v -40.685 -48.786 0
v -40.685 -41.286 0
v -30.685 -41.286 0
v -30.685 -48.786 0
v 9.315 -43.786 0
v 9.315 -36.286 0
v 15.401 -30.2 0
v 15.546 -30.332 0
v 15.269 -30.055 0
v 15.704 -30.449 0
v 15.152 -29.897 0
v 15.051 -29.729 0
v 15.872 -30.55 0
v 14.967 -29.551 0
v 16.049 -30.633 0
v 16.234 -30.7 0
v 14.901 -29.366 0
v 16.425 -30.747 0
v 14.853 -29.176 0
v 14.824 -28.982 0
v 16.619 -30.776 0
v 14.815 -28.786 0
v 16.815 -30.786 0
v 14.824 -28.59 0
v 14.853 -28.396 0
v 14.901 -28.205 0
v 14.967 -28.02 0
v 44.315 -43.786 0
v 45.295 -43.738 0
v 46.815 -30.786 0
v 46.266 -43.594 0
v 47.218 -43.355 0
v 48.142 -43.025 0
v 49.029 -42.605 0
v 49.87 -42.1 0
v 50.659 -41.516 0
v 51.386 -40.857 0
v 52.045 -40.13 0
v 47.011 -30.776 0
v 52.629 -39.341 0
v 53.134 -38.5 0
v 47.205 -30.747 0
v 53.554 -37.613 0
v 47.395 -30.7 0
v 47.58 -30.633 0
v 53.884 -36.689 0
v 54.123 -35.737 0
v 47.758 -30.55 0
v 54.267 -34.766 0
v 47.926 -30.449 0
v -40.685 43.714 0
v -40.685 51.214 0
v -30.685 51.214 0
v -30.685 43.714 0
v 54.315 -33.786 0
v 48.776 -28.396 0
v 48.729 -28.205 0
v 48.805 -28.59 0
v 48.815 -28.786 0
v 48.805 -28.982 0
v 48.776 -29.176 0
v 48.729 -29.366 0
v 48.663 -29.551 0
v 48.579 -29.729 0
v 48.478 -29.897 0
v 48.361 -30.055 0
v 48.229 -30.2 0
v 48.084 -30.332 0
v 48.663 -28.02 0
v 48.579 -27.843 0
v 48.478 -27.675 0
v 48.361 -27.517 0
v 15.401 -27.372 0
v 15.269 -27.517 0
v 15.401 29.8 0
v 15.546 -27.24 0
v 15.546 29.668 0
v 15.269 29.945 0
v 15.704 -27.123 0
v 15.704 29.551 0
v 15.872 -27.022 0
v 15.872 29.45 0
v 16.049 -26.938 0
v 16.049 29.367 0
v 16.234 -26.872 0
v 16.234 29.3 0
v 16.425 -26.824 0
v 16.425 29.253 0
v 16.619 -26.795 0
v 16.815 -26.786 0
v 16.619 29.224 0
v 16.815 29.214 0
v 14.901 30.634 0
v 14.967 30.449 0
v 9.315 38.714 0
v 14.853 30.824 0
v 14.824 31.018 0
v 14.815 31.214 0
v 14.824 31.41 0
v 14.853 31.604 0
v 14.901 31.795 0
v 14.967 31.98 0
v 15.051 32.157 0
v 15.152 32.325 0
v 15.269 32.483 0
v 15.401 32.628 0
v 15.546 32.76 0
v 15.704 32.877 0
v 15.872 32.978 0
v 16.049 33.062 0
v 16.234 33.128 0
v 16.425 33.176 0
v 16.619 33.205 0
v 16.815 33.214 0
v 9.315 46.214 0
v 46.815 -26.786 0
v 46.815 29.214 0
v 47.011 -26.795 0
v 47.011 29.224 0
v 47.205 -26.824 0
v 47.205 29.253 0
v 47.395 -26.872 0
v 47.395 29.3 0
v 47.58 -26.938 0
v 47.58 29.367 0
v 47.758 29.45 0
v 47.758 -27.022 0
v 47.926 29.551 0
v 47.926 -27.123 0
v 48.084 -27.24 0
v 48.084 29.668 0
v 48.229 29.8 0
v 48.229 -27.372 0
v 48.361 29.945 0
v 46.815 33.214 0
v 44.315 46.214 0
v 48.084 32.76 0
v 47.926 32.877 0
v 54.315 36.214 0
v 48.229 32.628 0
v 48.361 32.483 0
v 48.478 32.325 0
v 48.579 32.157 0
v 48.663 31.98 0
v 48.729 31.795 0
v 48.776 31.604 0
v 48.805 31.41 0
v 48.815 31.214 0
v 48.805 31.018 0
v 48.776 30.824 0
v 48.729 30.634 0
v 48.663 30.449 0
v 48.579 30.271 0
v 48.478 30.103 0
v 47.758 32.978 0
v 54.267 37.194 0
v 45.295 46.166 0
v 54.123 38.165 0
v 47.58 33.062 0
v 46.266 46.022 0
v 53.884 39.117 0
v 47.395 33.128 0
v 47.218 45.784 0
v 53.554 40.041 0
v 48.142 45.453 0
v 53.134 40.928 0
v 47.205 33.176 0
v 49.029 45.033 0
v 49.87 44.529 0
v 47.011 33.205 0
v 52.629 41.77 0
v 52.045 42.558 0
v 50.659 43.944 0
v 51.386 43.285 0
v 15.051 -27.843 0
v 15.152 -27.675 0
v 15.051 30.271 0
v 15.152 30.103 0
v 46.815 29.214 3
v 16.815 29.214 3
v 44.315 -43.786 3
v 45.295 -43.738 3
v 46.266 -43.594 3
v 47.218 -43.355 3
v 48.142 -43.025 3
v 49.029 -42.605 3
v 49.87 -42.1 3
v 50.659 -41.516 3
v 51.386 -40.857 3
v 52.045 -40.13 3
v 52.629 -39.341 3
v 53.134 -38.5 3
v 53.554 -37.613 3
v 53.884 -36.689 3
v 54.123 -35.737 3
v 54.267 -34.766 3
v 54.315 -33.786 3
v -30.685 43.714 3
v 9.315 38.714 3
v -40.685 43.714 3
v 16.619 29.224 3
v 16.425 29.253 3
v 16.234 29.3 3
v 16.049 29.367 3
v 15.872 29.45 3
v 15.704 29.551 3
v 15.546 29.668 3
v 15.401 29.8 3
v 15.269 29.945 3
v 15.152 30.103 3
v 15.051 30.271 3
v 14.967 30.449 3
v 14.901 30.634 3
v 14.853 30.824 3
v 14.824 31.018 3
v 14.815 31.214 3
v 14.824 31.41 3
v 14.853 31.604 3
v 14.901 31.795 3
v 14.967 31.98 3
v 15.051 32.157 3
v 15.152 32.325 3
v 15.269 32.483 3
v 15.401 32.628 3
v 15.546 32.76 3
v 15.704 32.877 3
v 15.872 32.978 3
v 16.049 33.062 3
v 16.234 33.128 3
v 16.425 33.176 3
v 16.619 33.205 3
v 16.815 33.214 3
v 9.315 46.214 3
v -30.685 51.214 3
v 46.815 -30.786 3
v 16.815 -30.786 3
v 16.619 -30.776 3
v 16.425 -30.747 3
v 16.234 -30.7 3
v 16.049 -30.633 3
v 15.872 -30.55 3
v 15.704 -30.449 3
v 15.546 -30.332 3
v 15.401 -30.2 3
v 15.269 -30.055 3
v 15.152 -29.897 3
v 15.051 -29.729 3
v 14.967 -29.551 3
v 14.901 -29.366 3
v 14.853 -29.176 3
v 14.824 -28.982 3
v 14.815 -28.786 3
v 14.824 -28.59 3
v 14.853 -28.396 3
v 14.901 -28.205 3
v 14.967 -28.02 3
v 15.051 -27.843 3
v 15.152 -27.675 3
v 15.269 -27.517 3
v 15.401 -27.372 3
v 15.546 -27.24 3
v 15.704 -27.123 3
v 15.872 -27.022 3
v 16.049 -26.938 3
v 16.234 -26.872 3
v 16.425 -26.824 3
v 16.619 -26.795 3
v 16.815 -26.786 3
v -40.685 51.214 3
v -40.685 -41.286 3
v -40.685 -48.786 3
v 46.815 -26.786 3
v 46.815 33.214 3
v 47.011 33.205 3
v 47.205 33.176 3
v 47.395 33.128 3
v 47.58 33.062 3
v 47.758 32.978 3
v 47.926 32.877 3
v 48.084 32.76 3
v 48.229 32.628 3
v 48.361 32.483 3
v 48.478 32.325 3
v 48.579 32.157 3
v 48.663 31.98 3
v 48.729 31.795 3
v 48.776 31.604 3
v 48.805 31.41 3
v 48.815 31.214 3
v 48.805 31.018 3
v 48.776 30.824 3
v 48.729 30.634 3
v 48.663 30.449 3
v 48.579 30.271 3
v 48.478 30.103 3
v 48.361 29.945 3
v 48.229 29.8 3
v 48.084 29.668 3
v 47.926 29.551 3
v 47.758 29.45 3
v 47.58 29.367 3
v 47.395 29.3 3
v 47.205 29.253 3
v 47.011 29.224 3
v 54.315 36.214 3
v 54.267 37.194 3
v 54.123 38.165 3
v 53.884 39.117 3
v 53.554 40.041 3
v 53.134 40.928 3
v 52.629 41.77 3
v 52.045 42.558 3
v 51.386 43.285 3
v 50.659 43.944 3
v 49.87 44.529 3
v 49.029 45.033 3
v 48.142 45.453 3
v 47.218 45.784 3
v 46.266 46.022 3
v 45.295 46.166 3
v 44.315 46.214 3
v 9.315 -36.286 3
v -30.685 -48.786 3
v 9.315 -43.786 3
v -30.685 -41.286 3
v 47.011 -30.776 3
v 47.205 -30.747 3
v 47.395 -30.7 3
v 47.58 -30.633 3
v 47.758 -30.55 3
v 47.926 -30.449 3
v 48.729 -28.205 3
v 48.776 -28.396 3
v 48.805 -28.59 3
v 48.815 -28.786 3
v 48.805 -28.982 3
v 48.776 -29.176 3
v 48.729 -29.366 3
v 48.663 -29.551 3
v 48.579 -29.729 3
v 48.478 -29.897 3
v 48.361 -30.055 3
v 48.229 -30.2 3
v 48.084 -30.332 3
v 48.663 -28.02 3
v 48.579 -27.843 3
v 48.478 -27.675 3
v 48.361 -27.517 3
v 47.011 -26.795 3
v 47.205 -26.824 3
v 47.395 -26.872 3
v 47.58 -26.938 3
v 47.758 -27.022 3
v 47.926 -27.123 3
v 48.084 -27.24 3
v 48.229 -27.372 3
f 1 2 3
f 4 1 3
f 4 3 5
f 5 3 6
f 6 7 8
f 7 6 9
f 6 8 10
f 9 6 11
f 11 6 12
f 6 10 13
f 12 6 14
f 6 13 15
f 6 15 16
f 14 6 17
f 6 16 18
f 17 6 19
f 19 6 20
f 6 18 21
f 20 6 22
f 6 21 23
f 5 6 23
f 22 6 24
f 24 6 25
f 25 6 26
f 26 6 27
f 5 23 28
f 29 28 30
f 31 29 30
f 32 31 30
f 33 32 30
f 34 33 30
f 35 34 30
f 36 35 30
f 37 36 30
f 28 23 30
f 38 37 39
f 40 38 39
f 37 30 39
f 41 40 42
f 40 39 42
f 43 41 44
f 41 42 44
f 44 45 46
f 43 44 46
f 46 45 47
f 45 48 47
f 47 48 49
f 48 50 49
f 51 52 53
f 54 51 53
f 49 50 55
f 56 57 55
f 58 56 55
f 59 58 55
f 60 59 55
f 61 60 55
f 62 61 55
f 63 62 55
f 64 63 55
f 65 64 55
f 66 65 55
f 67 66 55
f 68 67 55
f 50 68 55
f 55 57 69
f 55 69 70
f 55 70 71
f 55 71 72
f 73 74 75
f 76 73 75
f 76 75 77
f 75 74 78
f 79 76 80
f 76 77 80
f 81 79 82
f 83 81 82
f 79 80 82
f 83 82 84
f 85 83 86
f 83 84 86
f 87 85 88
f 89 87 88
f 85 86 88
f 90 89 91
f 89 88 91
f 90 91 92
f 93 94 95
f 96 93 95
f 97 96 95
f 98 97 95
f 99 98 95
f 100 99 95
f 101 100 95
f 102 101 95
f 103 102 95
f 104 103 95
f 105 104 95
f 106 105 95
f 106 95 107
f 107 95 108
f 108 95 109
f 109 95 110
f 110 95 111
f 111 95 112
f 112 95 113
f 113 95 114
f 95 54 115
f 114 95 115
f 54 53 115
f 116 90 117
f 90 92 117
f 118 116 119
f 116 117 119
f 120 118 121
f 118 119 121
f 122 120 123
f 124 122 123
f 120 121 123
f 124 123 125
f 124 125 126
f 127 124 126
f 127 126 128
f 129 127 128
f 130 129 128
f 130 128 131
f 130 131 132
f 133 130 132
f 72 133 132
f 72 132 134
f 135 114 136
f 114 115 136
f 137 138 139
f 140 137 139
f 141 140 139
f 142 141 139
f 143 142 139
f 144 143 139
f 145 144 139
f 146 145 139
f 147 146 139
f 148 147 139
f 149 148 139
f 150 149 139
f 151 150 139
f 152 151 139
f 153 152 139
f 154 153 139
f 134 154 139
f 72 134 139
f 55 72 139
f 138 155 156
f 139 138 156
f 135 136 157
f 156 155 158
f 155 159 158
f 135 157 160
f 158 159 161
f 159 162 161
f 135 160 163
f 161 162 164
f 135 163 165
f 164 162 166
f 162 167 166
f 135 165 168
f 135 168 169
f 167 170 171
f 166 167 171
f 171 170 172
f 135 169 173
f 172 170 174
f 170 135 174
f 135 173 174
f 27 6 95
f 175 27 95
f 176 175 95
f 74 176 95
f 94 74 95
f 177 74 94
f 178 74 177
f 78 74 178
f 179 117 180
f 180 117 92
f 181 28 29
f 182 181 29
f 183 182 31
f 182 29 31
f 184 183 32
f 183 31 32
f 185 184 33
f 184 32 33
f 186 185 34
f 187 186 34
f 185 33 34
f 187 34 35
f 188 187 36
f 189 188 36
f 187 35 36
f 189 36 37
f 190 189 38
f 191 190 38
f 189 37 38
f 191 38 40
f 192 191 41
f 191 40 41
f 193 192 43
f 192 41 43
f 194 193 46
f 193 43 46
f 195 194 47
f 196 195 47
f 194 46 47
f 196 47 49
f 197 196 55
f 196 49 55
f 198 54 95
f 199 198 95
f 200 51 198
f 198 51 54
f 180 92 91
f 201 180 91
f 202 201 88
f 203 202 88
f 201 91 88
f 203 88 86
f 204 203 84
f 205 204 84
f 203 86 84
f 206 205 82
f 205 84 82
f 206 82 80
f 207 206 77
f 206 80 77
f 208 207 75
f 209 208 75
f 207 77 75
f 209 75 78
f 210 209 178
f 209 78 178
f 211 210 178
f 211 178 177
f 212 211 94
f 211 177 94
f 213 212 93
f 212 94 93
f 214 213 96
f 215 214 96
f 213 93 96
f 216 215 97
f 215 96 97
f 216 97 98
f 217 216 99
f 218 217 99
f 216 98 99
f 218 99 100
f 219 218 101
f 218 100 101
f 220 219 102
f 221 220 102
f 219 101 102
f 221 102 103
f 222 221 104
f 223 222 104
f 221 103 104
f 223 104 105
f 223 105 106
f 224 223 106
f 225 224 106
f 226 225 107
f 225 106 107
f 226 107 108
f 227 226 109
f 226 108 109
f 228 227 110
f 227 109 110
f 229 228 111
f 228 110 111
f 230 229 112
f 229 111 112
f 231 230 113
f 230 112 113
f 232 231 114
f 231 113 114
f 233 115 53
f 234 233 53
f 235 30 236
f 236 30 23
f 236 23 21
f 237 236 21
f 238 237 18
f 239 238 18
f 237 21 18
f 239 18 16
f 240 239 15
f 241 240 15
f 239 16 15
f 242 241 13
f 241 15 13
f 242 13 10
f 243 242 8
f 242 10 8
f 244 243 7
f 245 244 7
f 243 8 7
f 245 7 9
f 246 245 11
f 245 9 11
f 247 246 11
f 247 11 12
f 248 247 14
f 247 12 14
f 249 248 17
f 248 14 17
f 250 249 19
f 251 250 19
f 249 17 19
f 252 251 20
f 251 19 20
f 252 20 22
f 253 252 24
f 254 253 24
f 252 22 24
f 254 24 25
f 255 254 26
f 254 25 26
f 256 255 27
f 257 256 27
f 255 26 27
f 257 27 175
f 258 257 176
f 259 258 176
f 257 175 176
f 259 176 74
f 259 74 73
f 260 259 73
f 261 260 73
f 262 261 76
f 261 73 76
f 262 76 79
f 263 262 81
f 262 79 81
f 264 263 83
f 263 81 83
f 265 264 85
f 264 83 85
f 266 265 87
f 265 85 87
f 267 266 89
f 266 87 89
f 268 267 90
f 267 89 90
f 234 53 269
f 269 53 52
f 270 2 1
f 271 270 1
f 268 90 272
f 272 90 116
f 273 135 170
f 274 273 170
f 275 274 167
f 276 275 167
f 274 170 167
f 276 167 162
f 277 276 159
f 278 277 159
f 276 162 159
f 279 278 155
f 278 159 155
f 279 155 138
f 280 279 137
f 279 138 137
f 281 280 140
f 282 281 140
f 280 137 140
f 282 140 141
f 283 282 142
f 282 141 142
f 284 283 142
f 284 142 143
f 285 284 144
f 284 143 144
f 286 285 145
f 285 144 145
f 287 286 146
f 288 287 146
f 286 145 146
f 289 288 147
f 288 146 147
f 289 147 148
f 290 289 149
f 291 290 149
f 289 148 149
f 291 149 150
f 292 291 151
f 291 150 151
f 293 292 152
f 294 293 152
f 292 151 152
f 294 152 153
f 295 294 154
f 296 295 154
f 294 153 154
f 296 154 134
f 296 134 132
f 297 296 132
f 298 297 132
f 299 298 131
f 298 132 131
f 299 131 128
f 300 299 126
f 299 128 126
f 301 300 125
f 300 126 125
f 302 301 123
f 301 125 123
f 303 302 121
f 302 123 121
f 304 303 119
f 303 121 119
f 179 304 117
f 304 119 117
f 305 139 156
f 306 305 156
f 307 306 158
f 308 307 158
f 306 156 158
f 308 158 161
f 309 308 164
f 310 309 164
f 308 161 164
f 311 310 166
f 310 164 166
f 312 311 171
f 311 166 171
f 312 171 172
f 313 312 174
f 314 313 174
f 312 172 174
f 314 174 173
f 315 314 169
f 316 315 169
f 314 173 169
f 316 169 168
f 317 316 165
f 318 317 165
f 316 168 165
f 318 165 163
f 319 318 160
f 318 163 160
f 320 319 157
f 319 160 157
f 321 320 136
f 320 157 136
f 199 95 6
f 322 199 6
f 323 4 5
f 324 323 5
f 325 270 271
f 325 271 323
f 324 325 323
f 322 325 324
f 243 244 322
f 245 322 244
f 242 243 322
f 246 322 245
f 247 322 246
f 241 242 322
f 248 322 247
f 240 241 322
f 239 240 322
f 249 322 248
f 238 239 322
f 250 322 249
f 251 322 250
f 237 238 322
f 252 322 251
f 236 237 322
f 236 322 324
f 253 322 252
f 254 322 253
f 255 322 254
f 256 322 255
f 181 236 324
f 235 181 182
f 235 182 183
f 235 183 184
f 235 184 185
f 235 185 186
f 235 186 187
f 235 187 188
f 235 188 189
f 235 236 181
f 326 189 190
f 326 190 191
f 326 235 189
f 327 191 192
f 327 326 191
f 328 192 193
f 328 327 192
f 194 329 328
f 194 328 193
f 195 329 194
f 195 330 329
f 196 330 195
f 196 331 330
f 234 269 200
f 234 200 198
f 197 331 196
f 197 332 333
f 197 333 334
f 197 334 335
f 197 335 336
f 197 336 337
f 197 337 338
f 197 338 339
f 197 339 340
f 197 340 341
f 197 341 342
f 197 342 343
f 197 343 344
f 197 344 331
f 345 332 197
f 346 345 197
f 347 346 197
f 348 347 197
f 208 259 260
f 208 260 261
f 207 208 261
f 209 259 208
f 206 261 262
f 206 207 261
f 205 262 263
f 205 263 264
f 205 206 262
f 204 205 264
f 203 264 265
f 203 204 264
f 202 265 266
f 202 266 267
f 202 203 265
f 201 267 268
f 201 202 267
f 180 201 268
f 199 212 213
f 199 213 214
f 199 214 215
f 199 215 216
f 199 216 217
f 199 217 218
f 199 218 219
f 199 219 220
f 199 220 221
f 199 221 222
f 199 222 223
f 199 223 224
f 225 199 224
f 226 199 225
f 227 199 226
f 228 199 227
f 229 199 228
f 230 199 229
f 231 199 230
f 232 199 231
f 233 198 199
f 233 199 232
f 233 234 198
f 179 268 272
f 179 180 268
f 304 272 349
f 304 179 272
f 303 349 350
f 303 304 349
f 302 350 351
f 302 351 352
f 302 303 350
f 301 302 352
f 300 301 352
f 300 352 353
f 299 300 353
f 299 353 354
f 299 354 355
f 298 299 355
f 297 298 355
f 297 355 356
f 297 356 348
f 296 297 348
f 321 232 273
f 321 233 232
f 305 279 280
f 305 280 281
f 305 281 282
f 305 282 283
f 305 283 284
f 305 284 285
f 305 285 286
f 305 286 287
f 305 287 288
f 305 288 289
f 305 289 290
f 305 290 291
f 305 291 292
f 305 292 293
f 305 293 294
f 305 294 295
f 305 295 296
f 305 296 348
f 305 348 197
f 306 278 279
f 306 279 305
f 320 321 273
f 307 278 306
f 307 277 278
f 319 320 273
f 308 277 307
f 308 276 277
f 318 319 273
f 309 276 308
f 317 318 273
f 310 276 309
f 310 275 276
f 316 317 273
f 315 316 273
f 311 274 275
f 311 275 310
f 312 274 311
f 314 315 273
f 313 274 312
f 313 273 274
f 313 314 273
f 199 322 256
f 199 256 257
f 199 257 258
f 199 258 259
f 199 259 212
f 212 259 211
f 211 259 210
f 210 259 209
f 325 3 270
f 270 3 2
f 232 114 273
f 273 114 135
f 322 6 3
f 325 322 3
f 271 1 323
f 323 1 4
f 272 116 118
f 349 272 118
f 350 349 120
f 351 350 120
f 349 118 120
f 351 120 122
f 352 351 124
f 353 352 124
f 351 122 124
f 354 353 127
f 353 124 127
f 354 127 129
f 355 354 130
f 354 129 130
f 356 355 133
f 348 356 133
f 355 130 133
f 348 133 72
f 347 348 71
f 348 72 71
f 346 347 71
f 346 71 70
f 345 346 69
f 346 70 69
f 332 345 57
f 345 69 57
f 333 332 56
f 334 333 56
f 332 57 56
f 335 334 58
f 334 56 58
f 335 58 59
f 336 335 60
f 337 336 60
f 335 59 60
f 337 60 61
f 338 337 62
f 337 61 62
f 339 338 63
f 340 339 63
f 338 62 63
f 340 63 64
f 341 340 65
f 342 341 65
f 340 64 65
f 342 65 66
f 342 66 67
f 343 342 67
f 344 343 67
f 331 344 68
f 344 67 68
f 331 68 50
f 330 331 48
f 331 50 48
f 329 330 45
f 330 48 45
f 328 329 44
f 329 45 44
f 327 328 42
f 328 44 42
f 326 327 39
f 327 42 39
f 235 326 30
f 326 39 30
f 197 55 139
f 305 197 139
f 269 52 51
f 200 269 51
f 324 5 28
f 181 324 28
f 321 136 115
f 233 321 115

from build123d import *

# Parameters (mm, degrees)
F1_DEPTH = 3


with BuildPart() as f1:
    # F0 (on Top) → F1 (new body)
    with BuildSketch(Plane.XY):
        with BuildLine():
            ThreePointArc((54.314782, 36.214286), (51.38585, 43.285354), (44.314782, 46.214286))
            Line((44.314782, 46.214286), (9.314782, 46.214286))
            Line((9.314782, 46.214286), (-30.685218, 51.214286))
            Line((-30.685218, 51.214286), (-40.685218, 51.214286))
            Line((-40.685218, 51.214286), (-40.685218, 43.714286))
            Line((-40.685218, 43.714286), (-30.685218, 43.714286))
            Line((-30.685218, 43.714286), (9.314782, 38.714286))
            Line((9.314782, 38.714286), (9.314782, -36.285714))
            Line((9.314782, -36.285714), (-30.685218, -41.285714))
            Line((-30.685218, -41.285714), (-40.685218, -41.285714))
            Line((-40.685218, -41.285714), (-40.685218, -48.785714))
            Line((-40.685218, -48.785714), (-30.685218, -48.785714))
            Line((-30.685218, -48.785714), (9.314782, -43.785714))
            Line((9.314782, -43.785714), (44.314782, -43.785714))
            ThreePointArc((44.314782, -43.785714), (51.38585, -40.856782), (54.314782, -33.785714))
            Line((54.314782, -33.785714), (54.314782, 36.214286))
        make_face()
        with BuildLine():
            Line((46.814782, -30.785714), (16.814782, -30.785714))
            ThreePointArc((16.814782, -30.785714), (14.814782, -28.785714), (16.814782, -26.785714))
            Line((16.814782, -26.785714), (46.814782, -26.785714))
            ThreePointArc((46.814782, -26.785714), (48.814782, -28.785714), (46.814782, -30.785714))
        make_face(mode=Mode.SUBTRACT)
        with BuildLine():
            ThreePointArc((46.814782, 33.214286), (48.814782, 31.214286), (46.814782, 29.214286))
            Line((46.814782, 29.214286), (16.814782, 29.214286))
            ThreePointArc((16.814782, 29.214286), (14.814782, 31.214286), (16.814782, 33.214286))
            Line((16.814782, 33.214286), (46.814782, 33.214286))
        make_face(mode=Mode.SUBTRACT)
    extrude(amount=F1_DEPTH)


solid = f1.part
